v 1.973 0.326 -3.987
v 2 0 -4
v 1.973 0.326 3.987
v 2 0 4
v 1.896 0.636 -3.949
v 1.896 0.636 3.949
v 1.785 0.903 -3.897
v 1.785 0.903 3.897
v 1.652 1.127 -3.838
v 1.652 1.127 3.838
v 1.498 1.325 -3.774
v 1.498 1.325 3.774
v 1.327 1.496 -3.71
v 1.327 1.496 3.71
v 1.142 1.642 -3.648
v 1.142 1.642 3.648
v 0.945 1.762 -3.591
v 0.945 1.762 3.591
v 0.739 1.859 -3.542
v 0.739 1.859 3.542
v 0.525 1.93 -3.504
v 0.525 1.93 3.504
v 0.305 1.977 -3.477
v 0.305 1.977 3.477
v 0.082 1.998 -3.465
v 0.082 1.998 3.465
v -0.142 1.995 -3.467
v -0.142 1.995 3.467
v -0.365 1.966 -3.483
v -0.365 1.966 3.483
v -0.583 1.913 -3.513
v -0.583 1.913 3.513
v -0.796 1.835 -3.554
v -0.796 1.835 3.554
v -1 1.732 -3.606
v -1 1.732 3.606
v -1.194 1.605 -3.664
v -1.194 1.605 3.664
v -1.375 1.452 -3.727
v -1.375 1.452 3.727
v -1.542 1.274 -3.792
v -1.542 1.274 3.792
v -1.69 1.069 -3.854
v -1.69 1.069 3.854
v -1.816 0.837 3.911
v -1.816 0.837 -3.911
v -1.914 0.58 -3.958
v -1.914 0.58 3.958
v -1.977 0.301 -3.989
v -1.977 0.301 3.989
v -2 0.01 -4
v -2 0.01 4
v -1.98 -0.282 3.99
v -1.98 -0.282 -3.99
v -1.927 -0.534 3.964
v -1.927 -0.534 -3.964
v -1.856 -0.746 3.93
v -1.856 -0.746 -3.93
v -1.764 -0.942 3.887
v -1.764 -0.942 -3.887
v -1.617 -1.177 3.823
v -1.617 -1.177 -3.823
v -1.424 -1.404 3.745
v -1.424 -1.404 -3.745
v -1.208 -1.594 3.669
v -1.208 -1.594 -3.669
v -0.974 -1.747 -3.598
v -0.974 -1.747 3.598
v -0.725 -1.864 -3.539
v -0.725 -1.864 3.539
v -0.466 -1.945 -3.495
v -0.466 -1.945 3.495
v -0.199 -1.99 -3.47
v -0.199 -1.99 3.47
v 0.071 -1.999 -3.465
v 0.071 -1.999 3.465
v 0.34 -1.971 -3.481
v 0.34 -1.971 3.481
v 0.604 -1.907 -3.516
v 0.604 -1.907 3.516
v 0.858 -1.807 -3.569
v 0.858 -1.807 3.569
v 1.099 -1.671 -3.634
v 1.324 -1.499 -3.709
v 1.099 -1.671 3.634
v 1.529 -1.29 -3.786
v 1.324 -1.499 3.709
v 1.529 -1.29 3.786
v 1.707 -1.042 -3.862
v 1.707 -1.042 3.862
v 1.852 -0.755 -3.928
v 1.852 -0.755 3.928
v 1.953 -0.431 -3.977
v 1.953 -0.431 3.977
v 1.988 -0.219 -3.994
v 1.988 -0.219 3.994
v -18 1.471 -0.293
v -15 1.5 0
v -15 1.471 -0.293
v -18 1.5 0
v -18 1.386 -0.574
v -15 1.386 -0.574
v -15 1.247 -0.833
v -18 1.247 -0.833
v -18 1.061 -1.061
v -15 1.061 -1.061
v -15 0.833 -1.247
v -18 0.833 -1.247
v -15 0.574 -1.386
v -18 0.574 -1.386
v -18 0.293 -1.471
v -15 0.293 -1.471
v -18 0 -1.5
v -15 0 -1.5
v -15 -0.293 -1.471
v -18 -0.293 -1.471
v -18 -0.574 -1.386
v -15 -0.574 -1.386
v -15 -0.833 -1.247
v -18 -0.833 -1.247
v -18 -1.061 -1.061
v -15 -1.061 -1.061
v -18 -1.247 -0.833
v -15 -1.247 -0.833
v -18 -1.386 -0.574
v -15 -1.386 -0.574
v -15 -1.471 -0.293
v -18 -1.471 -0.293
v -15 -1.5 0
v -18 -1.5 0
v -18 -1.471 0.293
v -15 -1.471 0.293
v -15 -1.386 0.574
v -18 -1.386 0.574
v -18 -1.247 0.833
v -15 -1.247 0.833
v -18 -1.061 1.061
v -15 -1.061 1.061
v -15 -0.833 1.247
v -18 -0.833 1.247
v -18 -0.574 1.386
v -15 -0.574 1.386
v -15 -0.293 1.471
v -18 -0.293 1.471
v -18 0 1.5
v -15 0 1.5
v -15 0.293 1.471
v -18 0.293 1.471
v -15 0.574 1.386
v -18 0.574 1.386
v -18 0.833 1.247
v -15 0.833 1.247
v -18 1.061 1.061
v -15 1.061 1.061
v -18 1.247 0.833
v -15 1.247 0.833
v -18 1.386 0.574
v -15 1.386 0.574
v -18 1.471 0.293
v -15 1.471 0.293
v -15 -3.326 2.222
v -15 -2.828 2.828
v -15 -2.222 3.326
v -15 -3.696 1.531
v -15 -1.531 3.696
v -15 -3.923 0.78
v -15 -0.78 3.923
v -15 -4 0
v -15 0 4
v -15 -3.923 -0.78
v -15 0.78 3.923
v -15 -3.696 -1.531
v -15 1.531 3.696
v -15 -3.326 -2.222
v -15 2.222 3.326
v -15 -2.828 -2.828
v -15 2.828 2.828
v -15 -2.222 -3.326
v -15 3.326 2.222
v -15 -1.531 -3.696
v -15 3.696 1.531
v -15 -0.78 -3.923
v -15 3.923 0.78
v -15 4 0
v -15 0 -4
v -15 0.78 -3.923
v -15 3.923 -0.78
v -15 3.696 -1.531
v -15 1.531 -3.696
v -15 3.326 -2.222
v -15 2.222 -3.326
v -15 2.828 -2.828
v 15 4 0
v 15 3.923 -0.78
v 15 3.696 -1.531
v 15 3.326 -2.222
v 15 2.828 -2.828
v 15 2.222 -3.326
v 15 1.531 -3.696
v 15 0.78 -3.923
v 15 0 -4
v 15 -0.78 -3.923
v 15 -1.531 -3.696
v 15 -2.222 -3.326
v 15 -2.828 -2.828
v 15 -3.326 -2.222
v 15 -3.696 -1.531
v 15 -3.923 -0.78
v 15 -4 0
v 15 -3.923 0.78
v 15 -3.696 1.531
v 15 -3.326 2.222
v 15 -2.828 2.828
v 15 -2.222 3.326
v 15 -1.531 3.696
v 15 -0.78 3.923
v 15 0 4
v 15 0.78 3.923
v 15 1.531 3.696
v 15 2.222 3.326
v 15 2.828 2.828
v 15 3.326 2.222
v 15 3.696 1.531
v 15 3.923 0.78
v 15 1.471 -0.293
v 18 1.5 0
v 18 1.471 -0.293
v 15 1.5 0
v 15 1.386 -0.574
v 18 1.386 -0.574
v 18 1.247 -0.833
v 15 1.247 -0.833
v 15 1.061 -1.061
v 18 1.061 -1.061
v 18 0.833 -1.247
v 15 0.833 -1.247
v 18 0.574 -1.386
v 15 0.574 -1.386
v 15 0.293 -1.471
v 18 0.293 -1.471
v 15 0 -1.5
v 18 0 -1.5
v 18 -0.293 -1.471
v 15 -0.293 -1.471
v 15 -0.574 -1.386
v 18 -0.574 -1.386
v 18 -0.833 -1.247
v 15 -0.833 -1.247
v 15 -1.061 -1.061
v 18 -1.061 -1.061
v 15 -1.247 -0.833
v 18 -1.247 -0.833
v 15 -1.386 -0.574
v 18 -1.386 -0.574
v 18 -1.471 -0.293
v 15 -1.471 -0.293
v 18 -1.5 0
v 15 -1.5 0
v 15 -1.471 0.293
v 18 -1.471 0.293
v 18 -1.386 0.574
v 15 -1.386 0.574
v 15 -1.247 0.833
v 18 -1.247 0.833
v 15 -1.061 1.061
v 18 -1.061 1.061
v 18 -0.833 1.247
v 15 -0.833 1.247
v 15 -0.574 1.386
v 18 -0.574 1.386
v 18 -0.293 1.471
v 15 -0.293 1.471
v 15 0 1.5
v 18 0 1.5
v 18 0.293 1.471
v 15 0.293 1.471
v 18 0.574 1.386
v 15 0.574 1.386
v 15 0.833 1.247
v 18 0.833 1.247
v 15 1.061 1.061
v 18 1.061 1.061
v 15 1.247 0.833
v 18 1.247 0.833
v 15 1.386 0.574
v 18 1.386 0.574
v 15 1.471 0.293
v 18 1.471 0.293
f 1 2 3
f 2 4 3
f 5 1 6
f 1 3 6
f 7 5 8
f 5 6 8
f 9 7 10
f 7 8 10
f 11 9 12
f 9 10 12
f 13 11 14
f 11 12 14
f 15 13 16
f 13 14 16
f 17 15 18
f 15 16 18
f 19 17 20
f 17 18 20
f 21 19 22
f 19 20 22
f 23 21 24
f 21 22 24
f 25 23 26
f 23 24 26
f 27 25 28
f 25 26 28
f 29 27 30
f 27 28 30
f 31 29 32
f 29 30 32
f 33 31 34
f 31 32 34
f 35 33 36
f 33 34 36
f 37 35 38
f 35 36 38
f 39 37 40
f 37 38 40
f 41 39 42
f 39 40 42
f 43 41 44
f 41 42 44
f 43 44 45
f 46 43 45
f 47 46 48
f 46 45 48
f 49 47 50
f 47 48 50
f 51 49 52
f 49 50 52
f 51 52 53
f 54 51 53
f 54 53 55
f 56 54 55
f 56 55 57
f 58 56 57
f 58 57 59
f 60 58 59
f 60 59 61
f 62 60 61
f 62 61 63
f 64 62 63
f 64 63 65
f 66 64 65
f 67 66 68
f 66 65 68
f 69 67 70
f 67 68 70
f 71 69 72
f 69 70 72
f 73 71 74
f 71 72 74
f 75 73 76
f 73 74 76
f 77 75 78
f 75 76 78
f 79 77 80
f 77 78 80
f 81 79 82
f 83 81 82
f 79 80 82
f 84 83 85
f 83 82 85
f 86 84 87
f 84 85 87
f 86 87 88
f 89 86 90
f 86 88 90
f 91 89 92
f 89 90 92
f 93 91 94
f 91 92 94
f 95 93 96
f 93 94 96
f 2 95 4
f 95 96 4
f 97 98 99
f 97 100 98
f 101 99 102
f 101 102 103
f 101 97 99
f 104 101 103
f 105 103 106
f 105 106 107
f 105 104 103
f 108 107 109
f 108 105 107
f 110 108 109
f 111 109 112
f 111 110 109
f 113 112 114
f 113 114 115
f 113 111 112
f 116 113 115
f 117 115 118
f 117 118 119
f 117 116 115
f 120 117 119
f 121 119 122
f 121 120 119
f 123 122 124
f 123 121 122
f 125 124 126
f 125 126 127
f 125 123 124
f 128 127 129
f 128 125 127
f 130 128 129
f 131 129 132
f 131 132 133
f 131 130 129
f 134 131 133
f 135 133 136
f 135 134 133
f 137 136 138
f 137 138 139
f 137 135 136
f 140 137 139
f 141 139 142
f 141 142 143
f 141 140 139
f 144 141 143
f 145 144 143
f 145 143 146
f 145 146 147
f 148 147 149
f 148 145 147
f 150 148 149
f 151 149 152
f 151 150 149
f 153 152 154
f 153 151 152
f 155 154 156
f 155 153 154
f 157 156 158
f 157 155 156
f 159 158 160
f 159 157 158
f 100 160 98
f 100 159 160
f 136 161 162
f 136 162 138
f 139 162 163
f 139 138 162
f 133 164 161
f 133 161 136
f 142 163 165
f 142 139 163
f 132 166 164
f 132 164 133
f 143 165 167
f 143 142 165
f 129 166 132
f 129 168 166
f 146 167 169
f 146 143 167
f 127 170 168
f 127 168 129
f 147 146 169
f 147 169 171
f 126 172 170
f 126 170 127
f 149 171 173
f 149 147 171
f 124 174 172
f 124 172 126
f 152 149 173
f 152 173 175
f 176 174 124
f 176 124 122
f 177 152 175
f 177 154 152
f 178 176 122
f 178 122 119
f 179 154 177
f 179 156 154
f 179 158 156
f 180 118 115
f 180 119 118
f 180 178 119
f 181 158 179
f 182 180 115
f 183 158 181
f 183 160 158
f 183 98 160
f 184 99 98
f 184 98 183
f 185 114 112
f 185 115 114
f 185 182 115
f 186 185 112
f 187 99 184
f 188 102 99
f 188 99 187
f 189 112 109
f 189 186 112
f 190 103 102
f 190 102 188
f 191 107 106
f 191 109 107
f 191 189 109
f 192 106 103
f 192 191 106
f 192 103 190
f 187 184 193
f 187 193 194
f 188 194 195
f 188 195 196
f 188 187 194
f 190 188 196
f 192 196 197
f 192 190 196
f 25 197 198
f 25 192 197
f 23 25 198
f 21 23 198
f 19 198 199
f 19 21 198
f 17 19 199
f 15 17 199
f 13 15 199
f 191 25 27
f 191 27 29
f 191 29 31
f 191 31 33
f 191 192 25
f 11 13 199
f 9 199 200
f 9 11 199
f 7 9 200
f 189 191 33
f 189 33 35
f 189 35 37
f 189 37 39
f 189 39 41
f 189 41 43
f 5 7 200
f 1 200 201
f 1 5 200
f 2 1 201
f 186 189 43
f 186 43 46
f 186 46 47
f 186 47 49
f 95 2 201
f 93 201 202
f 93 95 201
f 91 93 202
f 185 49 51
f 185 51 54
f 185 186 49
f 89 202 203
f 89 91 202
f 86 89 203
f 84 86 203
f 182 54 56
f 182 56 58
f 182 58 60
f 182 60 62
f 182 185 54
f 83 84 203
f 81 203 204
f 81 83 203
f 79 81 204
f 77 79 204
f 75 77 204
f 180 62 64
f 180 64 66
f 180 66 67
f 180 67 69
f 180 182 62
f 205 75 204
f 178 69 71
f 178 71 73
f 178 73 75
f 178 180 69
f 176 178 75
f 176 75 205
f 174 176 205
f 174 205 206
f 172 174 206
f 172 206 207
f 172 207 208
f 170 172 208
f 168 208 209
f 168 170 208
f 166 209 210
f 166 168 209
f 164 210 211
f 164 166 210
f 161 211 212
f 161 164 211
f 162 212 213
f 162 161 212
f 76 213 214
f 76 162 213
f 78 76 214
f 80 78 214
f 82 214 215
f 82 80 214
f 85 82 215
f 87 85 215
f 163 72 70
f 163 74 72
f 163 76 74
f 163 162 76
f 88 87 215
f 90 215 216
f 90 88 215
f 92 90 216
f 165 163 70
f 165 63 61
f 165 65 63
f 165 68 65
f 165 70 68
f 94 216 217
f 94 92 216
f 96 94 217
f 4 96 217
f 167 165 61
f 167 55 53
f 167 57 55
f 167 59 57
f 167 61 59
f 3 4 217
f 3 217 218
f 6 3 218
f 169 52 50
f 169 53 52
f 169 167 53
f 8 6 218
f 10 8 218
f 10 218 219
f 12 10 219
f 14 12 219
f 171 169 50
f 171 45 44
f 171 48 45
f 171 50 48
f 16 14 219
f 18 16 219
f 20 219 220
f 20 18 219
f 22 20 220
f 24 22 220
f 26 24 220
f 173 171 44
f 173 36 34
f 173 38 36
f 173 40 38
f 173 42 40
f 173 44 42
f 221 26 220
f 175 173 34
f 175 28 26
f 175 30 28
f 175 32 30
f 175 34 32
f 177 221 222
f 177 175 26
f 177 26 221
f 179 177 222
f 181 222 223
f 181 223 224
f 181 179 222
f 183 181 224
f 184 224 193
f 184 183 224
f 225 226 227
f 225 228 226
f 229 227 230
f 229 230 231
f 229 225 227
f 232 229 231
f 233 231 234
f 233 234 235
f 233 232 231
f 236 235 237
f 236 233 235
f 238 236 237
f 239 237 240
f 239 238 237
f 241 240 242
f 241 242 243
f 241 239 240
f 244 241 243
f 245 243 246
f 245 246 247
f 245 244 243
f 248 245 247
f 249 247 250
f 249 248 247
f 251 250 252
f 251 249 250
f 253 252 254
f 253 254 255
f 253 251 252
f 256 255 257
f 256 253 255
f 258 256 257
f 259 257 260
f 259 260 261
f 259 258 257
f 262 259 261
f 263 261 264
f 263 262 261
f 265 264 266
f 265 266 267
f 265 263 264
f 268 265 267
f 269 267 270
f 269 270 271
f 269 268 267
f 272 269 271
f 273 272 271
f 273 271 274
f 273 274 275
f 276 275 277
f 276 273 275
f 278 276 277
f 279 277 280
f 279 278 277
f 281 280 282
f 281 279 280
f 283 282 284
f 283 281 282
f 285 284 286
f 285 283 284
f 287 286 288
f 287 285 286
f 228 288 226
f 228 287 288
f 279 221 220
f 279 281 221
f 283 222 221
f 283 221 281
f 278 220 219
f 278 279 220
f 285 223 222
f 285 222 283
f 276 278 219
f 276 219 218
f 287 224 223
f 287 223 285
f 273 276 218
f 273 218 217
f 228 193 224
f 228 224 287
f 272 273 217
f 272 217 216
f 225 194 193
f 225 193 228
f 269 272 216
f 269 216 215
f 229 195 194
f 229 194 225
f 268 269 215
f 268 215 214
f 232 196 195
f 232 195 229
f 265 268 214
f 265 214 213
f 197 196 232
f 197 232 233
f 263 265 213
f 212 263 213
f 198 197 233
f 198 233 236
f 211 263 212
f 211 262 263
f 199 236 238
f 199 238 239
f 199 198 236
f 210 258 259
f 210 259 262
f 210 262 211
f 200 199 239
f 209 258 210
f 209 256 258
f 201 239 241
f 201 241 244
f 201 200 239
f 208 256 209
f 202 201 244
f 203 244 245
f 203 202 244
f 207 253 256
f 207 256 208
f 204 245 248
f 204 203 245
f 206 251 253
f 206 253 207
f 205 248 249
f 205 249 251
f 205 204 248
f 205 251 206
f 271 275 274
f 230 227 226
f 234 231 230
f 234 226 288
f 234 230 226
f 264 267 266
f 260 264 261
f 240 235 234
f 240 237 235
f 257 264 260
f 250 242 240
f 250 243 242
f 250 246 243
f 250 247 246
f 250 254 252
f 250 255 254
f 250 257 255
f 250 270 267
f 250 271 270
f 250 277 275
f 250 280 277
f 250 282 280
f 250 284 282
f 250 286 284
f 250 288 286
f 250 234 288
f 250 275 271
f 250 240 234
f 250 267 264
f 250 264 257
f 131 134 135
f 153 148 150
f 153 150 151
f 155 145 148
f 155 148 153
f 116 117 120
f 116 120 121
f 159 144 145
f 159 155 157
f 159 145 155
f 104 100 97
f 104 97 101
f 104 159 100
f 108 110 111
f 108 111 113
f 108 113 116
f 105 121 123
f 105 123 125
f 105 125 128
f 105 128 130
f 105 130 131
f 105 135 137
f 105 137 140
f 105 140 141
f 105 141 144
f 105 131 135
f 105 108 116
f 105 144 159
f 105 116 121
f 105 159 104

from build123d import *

# Parameters (mm, degrees)
F2_R     = 2
F3_DEPTH = 5


with BuildPart() as f1:
    # F0 (on Top) → F1 (revolve)
    with BuildSketch(Plane.XY):
        Polygon((-18, 1.5), (-18, 0), (18, 0), (18, 1.5), (15, 1.5), (15, 4), (-15, 4), (-15, 1.5), align=None)
    revolve(axis=Axis((0, 0, 0), (-1, 0, 0)))

    # F2 (on Top) → F3 (cut, symmetric)
    with BuildSketch(Plane.XY):
        Circle(F2_R)
    extrude(amount=F3_DEPTH, both=True, mode=Mode.SUBTRACT)


solid = f1.part
